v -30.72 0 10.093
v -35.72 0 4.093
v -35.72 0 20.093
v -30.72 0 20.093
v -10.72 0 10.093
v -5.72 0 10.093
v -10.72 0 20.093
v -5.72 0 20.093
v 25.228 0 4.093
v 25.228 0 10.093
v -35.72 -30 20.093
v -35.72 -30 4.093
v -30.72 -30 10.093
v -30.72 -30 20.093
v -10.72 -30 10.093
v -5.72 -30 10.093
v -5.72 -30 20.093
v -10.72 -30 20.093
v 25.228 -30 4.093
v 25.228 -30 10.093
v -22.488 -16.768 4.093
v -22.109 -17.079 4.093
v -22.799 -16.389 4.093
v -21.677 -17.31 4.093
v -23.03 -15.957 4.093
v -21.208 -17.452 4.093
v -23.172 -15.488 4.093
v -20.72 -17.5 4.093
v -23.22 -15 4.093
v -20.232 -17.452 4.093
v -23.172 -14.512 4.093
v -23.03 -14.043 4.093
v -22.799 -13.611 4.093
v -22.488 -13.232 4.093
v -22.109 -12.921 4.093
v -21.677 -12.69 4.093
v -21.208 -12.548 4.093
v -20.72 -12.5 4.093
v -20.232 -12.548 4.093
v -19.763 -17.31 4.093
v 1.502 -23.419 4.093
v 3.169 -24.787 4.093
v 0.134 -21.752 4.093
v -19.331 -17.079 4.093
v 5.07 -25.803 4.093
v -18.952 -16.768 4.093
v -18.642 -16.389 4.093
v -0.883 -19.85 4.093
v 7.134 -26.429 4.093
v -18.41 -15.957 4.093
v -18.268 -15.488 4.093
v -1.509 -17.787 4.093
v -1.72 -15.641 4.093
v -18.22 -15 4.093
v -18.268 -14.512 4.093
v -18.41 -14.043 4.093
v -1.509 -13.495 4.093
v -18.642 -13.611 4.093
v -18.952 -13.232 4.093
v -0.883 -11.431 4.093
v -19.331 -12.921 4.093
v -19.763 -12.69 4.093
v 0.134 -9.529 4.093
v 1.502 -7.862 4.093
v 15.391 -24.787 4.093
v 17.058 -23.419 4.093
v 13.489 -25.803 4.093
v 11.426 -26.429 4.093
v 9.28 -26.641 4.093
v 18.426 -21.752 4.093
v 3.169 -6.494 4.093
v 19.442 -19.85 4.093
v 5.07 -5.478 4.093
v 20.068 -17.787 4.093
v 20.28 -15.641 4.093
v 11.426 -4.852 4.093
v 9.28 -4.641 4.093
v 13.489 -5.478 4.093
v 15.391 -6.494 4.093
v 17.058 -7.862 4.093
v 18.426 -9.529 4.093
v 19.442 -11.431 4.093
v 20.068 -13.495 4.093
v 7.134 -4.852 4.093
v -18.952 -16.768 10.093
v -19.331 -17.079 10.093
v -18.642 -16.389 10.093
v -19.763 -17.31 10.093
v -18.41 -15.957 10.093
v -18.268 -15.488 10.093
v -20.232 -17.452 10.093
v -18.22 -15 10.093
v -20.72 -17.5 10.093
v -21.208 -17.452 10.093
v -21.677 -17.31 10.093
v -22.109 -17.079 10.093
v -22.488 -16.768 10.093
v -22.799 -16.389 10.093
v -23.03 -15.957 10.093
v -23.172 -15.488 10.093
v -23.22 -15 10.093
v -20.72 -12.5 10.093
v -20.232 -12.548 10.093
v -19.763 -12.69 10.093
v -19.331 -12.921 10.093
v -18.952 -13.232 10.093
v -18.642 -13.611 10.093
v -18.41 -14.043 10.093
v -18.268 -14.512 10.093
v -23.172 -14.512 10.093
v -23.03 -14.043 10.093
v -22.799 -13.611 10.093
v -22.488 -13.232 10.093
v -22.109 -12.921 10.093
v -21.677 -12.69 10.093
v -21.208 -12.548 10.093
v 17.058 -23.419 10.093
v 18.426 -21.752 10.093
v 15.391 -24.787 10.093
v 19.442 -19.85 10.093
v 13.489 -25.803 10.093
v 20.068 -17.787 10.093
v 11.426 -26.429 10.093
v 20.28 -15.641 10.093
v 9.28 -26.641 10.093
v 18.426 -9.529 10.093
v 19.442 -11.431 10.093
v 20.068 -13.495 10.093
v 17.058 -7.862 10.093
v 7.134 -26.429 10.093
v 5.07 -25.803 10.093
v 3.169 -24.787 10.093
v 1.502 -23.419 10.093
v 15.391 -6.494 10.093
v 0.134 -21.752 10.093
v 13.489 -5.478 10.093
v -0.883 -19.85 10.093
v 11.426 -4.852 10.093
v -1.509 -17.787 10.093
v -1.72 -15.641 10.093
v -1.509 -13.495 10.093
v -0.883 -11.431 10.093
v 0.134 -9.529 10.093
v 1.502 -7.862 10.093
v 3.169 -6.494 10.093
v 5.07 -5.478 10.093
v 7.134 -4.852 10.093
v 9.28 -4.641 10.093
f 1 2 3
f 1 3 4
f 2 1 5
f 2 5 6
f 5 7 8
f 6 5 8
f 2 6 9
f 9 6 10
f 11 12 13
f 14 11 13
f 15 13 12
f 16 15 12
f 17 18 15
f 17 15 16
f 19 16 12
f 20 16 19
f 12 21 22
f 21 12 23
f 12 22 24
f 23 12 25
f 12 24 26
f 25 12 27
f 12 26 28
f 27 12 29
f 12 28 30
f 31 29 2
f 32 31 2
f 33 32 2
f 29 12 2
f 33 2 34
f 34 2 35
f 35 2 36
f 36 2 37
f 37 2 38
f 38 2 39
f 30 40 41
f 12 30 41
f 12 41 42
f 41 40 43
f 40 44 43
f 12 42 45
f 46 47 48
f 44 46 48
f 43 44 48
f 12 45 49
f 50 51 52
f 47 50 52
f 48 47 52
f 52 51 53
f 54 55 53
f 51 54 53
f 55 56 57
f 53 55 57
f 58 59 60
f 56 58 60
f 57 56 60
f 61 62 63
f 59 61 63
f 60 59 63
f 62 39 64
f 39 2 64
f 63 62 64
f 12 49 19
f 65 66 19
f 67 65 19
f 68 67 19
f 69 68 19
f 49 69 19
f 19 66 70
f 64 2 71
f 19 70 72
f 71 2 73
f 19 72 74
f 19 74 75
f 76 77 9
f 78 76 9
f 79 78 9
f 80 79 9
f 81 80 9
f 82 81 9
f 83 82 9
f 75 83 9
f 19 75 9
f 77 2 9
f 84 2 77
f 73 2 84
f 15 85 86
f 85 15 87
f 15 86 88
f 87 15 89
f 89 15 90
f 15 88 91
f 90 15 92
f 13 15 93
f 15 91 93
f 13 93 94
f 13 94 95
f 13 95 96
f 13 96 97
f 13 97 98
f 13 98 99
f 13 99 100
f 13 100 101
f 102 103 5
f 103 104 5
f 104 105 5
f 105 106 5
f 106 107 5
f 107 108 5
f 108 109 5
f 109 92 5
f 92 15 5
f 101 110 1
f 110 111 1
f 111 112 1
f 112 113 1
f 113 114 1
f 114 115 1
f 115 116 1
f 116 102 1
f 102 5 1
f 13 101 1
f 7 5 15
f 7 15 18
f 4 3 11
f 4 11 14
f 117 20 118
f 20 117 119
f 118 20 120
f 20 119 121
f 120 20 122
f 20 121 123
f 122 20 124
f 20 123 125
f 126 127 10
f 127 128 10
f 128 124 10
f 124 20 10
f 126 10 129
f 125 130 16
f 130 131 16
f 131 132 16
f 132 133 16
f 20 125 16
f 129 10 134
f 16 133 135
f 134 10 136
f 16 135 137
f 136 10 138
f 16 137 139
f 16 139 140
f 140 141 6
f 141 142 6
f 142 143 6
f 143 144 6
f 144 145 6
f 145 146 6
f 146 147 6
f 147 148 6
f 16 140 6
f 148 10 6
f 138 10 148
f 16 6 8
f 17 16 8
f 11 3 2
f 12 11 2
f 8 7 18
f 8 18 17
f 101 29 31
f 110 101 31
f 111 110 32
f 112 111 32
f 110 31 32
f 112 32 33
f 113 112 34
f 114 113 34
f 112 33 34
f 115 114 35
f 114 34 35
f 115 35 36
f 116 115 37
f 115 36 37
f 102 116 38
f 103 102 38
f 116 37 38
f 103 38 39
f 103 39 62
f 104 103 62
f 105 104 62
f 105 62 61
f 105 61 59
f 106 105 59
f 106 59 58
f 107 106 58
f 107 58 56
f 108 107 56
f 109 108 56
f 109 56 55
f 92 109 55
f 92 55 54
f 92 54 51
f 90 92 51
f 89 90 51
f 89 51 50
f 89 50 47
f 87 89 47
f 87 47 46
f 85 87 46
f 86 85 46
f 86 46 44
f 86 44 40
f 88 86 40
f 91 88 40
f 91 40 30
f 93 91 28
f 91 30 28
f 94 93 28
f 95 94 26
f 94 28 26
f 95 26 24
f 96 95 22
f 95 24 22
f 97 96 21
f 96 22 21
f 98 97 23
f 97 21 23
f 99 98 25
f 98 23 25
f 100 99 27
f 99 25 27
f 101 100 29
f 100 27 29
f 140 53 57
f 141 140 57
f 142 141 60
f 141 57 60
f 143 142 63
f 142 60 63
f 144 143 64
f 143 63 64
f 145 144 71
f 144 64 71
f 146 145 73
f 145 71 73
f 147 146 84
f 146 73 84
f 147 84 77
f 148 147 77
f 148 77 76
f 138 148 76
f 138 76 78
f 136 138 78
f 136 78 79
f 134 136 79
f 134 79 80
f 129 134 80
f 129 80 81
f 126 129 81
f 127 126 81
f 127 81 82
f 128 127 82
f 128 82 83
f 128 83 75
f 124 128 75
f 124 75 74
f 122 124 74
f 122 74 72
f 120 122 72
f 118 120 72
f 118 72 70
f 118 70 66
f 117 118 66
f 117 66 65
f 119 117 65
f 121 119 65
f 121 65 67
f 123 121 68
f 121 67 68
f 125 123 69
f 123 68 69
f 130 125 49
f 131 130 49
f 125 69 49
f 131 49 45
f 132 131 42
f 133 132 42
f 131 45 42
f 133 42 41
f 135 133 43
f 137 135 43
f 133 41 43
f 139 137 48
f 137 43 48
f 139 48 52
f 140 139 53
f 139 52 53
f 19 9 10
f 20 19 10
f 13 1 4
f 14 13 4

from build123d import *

# Parameters (mm, degrees)
F0_W     = 5
F0_H     = 10
F1_DEPTH = 30
F3_D     = 22
F5_D     = 5


# Not quite as in the source:
# - a feature names something its author has since deleted; it is built from what else it names


with BuildPart() as f1:
    # F0 (on Front) → F1 (new body)
    with BuildSketch(Plane.XZ):
        with Locations((-33.2201862009, 15.0932593657)):
            Rectangle(F0_W, F0_H)
        Polygon((-30.7201862009, 10.0932593657), (-35.7201862009, 10.0932593657), (-35.7201862009, 4.0932593657), (25.2284052642, 4.0932593657), (25.2284052642, 10.0932593657), (-5.7201862009, 10.0932593657), (-10.7201862009, 10.0932593657), align=None)
        with Locations((-8.2201862009, 15.0932593657)):
            Rectangle(F0_W, F0_H)
    extrude(amount=F1_DEPTH)

    # F3 (through all)
    with Locations(Plane.XY.offset(10.0932593657)):
        with Locations((9.2798137991, -15.640585908)):
            Hole(F3_D / 2)

    # F5 (through all)
    with Locations(Plane.XY.offset(10.0932593657)):
        with Locations((-20.7201862009, -15)):
            Hole(F5_D / 2)


solid = f1.part
